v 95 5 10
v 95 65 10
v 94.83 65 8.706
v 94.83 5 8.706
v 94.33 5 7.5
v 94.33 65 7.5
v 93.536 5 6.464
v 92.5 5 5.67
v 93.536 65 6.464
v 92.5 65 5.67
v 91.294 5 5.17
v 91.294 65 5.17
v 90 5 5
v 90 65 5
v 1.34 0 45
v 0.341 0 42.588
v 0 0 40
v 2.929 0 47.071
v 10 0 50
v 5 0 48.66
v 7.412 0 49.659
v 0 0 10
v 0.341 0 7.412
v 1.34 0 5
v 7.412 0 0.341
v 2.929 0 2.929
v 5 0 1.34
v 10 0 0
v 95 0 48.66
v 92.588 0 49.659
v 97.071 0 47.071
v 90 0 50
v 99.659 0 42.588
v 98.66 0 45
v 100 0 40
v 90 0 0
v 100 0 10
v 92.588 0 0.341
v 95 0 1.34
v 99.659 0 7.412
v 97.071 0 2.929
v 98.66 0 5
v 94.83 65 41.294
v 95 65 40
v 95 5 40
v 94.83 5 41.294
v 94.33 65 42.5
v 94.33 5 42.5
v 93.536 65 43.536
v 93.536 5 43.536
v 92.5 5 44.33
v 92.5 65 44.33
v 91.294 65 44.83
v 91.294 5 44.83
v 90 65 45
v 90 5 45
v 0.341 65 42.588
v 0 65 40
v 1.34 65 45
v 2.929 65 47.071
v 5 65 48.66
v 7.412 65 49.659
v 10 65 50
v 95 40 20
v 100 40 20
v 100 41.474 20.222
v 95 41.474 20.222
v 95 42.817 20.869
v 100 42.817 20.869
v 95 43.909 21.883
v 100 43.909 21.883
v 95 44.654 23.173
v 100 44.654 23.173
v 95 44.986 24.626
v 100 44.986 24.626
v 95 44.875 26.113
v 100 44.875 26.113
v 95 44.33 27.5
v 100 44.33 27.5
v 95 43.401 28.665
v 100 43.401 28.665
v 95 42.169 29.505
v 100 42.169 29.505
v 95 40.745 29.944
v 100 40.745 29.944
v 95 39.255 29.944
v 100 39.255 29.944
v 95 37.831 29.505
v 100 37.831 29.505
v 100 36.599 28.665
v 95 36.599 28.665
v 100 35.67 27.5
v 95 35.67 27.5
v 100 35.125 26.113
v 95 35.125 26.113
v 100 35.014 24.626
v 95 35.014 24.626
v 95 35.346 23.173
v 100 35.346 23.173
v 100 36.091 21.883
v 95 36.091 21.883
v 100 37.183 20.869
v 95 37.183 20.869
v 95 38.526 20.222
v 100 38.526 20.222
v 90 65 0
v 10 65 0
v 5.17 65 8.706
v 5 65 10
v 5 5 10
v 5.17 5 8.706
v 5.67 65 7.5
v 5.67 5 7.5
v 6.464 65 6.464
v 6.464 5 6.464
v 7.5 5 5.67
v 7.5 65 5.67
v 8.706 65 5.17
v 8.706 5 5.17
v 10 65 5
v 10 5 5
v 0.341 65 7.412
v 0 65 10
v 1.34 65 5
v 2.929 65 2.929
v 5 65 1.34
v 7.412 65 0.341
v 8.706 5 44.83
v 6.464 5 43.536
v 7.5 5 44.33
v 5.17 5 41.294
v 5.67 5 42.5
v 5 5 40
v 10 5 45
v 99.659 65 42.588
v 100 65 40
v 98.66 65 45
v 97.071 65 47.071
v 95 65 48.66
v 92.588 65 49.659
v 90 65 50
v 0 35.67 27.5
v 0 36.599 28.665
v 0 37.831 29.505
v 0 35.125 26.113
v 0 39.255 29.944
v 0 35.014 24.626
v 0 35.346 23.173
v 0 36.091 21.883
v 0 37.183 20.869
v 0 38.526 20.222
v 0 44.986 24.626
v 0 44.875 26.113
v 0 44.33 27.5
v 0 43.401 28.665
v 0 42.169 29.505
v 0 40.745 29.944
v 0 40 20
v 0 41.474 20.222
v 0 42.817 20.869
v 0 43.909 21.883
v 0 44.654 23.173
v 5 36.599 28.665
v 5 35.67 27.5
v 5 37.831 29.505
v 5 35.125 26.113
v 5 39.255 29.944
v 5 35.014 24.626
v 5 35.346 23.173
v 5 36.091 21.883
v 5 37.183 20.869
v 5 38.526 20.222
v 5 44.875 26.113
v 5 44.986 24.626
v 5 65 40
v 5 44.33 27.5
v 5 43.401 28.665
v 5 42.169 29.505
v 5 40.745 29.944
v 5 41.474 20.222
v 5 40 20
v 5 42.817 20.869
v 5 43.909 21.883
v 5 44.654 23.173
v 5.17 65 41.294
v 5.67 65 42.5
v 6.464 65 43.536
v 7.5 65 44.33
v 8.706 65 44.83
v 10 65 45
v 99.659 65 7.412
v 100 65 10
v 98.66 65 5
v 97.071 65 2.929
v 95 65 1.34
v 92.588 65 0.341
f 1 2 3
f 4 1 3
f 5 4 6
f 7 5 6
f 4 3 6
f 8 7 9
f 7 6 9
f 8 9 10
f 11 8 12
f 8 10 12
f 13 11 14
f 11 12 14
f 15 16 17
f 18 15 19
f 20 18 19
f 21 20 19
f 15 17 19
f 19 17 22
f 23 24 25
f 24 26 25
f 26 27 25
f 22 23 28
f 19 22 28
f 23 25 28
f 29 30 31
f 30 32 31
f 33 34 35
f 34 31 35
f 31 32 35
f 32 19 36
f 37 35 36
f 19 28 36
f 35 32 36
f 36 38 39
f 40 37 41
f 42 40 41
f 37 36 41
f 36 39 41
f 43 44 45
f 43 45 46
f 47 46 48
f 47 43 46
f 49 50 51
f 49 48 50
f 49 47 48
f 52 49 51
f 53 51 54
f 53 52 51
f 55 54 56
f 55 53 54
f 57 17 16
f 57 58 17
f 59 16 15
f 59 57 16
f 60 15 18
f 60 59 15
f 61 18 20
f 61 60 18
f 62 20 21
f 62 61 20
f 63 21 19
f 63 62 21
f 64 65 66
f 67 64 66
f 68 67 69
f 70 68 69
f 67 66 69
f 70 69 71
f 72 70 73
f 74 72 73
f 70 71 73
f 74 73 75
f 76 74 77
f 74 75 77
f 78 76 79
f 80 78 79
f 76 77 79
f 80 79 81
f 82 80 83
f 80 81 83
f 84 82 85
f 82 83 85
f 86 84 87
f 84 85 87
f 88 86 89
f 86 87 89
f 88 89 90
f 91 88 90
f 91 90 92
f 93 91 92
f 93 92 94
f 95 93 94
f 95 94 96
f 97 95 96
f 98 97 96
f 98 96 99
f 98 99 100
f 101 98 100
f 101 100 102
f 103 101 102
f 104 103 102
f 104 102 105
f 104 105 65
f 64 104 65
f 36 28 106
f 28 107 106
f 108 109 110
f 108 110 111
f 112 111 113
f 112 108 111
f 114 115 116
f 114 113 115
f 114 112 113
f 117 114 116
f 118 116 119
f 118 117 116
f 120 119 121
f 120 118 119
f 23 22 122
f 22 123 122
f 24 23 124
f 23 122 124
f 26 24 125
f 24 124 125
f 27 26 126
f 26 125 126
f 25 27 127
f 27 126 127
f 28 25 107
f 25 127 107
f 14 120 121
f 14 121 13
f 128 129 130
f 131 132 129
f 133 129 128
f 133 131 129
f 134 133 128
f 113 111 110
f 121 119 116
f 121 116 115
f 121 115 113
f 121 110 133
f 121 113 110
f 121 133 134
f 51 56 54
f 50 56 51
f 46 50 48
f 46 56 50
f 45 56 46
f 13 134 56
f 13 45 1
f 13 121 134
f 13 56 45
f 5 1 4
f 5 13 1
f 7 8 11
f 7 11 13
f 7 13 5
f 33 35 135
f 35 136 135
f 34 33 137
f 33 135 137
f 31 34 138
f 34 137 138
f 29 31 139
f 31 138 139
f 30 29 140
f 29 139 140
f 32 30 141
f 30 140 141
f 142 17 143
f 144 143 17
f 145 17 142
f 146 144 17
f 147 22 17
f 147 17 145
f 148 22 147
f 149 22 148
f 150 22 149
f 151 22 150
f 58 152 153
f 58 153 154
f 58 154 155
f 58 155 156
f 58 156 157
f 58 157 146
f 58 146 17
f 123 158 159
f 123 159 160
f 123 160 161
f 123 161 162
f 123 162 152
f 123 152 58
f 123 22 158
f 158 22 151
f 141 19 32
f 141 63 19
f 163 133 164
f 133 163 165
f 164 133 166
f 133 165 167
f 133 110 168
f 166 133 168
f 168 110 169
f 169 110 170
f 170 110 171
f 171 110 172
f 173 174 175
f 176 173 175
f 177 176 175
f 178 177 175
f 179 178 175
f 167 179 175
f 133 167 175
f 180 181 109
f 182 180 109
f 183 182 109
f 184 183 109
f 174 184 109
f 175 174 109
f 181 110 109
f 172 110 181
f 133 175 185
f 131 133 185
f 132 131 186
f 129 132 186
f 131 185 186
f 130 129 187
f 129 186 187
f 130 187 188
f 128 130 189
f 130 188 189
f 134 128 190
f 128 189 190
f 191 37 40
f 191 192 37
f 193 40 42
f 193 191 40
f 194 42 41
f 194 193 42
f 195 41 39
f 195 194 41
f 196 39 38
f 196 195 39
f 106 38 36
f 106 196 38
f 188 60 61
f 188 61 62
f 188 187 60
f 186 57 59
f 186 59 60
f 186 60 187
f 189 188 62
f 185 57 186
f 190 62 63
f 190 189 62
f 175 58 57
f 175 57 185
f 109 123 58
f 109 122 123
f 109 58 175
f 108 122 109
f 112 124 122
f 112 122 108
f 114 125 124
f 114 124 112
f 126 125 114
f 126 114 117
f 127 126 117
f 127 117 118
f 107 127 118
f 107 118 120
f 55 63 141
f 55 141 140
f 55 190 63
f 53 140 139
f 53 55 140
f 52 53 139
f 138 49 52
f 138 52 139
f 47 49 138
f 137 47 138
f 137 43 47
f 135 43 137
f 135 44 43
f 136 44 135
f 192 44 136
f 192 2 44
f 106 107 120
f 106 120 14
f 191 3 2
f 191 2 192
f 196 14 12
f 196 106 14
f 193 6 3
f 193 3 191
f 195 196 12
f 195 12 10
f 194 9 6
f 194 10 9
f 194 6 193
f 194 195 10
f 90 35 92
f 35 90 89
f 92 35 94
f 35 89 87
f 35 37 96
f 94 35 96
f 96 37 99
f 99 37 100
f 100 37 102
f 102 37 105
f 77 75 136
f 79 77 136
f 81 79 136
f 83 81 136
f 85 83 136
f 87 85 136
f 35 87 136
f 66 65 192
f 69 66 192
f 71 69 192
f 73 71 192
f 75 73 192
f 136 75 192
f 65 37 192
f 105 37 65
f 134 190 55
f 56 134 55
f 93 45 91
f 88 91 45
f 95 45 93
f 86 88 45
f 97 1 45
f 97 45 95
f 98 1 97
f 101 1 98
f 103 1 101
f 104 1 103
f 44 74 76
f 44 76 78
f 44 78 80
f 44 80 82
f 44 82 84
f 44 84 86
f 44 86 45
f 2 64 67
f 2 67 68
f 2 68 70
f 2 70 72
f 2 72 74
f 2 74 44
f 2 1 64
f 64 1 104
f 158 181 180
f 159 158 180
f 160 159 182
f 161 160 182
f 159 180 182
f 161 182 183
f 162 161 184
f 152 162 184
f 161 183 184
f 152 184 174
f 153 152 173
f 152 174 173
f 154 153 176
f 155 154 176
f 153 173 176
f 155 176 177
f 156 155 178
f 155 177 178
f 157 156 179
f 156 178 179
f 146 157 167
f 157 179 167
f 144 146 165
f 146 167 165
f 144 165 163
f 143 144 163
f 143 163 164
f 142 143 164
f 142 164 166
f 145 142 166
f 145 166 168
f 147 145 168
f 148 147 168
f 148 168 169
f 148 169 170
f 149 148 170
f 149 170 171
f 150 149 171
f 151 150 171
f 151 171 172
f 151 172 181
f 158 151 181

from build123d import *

# Parameters (mm, degrees)
SKETCH2_W           = 100
SKETCH2_H           = 65
BOSS_EXTRUDE1_DEPTH = 50
FILLET1_R           = 10
SHELL1_T            = -5
SKETCH3_R           = 5
CUT_EXTRUDE1_DEPTH  = 101


with BuildPart() as part:
    # Sketch2 → Boss-Extrude1 (new body)
    with BuildSketch(Plane.XY):
        with Locations((50, 32.5)):
            Rectangle(SKETCH2_W, SKETCH2_H)
    extrude(amount=BOSS_EXTRUDE1_DEPTH)

    # Fillet1
    fillet1_edges = [part.edges().sort_by_distance(p)[0] for p in [
        (100, 32.5, 50),
        (0, 32.5, 50),
        (100, 32.5, 0),
        (0, 32.5, 0),
    ]]
    fillet(fillet1_edges, radius=FILLET1_R)

    # Shell1
    shell1_openings = [part.faces().sort_by_distance(p)[0] for p in [
        (50, 65, 25),
    ]]
    offset(amount=SHELL1_T, openings=shell1_openings, kind=Kind.INTERSECTION)

    # Sketch3 → Cut-Extrude1 (cut, through all)
    with BuildSketch(Plane(origin=(100, 0, 0), x_dir=(0, 0, -1), z_dir=(1, 0, 0))):
        with Locations((-25, 40)):
            Circle(SKETCH3_R)
    extrude(amount=-CUT_EXTRUDE1_DEPTH, mode=Mode.SUBTRACT)


solid = part.part
